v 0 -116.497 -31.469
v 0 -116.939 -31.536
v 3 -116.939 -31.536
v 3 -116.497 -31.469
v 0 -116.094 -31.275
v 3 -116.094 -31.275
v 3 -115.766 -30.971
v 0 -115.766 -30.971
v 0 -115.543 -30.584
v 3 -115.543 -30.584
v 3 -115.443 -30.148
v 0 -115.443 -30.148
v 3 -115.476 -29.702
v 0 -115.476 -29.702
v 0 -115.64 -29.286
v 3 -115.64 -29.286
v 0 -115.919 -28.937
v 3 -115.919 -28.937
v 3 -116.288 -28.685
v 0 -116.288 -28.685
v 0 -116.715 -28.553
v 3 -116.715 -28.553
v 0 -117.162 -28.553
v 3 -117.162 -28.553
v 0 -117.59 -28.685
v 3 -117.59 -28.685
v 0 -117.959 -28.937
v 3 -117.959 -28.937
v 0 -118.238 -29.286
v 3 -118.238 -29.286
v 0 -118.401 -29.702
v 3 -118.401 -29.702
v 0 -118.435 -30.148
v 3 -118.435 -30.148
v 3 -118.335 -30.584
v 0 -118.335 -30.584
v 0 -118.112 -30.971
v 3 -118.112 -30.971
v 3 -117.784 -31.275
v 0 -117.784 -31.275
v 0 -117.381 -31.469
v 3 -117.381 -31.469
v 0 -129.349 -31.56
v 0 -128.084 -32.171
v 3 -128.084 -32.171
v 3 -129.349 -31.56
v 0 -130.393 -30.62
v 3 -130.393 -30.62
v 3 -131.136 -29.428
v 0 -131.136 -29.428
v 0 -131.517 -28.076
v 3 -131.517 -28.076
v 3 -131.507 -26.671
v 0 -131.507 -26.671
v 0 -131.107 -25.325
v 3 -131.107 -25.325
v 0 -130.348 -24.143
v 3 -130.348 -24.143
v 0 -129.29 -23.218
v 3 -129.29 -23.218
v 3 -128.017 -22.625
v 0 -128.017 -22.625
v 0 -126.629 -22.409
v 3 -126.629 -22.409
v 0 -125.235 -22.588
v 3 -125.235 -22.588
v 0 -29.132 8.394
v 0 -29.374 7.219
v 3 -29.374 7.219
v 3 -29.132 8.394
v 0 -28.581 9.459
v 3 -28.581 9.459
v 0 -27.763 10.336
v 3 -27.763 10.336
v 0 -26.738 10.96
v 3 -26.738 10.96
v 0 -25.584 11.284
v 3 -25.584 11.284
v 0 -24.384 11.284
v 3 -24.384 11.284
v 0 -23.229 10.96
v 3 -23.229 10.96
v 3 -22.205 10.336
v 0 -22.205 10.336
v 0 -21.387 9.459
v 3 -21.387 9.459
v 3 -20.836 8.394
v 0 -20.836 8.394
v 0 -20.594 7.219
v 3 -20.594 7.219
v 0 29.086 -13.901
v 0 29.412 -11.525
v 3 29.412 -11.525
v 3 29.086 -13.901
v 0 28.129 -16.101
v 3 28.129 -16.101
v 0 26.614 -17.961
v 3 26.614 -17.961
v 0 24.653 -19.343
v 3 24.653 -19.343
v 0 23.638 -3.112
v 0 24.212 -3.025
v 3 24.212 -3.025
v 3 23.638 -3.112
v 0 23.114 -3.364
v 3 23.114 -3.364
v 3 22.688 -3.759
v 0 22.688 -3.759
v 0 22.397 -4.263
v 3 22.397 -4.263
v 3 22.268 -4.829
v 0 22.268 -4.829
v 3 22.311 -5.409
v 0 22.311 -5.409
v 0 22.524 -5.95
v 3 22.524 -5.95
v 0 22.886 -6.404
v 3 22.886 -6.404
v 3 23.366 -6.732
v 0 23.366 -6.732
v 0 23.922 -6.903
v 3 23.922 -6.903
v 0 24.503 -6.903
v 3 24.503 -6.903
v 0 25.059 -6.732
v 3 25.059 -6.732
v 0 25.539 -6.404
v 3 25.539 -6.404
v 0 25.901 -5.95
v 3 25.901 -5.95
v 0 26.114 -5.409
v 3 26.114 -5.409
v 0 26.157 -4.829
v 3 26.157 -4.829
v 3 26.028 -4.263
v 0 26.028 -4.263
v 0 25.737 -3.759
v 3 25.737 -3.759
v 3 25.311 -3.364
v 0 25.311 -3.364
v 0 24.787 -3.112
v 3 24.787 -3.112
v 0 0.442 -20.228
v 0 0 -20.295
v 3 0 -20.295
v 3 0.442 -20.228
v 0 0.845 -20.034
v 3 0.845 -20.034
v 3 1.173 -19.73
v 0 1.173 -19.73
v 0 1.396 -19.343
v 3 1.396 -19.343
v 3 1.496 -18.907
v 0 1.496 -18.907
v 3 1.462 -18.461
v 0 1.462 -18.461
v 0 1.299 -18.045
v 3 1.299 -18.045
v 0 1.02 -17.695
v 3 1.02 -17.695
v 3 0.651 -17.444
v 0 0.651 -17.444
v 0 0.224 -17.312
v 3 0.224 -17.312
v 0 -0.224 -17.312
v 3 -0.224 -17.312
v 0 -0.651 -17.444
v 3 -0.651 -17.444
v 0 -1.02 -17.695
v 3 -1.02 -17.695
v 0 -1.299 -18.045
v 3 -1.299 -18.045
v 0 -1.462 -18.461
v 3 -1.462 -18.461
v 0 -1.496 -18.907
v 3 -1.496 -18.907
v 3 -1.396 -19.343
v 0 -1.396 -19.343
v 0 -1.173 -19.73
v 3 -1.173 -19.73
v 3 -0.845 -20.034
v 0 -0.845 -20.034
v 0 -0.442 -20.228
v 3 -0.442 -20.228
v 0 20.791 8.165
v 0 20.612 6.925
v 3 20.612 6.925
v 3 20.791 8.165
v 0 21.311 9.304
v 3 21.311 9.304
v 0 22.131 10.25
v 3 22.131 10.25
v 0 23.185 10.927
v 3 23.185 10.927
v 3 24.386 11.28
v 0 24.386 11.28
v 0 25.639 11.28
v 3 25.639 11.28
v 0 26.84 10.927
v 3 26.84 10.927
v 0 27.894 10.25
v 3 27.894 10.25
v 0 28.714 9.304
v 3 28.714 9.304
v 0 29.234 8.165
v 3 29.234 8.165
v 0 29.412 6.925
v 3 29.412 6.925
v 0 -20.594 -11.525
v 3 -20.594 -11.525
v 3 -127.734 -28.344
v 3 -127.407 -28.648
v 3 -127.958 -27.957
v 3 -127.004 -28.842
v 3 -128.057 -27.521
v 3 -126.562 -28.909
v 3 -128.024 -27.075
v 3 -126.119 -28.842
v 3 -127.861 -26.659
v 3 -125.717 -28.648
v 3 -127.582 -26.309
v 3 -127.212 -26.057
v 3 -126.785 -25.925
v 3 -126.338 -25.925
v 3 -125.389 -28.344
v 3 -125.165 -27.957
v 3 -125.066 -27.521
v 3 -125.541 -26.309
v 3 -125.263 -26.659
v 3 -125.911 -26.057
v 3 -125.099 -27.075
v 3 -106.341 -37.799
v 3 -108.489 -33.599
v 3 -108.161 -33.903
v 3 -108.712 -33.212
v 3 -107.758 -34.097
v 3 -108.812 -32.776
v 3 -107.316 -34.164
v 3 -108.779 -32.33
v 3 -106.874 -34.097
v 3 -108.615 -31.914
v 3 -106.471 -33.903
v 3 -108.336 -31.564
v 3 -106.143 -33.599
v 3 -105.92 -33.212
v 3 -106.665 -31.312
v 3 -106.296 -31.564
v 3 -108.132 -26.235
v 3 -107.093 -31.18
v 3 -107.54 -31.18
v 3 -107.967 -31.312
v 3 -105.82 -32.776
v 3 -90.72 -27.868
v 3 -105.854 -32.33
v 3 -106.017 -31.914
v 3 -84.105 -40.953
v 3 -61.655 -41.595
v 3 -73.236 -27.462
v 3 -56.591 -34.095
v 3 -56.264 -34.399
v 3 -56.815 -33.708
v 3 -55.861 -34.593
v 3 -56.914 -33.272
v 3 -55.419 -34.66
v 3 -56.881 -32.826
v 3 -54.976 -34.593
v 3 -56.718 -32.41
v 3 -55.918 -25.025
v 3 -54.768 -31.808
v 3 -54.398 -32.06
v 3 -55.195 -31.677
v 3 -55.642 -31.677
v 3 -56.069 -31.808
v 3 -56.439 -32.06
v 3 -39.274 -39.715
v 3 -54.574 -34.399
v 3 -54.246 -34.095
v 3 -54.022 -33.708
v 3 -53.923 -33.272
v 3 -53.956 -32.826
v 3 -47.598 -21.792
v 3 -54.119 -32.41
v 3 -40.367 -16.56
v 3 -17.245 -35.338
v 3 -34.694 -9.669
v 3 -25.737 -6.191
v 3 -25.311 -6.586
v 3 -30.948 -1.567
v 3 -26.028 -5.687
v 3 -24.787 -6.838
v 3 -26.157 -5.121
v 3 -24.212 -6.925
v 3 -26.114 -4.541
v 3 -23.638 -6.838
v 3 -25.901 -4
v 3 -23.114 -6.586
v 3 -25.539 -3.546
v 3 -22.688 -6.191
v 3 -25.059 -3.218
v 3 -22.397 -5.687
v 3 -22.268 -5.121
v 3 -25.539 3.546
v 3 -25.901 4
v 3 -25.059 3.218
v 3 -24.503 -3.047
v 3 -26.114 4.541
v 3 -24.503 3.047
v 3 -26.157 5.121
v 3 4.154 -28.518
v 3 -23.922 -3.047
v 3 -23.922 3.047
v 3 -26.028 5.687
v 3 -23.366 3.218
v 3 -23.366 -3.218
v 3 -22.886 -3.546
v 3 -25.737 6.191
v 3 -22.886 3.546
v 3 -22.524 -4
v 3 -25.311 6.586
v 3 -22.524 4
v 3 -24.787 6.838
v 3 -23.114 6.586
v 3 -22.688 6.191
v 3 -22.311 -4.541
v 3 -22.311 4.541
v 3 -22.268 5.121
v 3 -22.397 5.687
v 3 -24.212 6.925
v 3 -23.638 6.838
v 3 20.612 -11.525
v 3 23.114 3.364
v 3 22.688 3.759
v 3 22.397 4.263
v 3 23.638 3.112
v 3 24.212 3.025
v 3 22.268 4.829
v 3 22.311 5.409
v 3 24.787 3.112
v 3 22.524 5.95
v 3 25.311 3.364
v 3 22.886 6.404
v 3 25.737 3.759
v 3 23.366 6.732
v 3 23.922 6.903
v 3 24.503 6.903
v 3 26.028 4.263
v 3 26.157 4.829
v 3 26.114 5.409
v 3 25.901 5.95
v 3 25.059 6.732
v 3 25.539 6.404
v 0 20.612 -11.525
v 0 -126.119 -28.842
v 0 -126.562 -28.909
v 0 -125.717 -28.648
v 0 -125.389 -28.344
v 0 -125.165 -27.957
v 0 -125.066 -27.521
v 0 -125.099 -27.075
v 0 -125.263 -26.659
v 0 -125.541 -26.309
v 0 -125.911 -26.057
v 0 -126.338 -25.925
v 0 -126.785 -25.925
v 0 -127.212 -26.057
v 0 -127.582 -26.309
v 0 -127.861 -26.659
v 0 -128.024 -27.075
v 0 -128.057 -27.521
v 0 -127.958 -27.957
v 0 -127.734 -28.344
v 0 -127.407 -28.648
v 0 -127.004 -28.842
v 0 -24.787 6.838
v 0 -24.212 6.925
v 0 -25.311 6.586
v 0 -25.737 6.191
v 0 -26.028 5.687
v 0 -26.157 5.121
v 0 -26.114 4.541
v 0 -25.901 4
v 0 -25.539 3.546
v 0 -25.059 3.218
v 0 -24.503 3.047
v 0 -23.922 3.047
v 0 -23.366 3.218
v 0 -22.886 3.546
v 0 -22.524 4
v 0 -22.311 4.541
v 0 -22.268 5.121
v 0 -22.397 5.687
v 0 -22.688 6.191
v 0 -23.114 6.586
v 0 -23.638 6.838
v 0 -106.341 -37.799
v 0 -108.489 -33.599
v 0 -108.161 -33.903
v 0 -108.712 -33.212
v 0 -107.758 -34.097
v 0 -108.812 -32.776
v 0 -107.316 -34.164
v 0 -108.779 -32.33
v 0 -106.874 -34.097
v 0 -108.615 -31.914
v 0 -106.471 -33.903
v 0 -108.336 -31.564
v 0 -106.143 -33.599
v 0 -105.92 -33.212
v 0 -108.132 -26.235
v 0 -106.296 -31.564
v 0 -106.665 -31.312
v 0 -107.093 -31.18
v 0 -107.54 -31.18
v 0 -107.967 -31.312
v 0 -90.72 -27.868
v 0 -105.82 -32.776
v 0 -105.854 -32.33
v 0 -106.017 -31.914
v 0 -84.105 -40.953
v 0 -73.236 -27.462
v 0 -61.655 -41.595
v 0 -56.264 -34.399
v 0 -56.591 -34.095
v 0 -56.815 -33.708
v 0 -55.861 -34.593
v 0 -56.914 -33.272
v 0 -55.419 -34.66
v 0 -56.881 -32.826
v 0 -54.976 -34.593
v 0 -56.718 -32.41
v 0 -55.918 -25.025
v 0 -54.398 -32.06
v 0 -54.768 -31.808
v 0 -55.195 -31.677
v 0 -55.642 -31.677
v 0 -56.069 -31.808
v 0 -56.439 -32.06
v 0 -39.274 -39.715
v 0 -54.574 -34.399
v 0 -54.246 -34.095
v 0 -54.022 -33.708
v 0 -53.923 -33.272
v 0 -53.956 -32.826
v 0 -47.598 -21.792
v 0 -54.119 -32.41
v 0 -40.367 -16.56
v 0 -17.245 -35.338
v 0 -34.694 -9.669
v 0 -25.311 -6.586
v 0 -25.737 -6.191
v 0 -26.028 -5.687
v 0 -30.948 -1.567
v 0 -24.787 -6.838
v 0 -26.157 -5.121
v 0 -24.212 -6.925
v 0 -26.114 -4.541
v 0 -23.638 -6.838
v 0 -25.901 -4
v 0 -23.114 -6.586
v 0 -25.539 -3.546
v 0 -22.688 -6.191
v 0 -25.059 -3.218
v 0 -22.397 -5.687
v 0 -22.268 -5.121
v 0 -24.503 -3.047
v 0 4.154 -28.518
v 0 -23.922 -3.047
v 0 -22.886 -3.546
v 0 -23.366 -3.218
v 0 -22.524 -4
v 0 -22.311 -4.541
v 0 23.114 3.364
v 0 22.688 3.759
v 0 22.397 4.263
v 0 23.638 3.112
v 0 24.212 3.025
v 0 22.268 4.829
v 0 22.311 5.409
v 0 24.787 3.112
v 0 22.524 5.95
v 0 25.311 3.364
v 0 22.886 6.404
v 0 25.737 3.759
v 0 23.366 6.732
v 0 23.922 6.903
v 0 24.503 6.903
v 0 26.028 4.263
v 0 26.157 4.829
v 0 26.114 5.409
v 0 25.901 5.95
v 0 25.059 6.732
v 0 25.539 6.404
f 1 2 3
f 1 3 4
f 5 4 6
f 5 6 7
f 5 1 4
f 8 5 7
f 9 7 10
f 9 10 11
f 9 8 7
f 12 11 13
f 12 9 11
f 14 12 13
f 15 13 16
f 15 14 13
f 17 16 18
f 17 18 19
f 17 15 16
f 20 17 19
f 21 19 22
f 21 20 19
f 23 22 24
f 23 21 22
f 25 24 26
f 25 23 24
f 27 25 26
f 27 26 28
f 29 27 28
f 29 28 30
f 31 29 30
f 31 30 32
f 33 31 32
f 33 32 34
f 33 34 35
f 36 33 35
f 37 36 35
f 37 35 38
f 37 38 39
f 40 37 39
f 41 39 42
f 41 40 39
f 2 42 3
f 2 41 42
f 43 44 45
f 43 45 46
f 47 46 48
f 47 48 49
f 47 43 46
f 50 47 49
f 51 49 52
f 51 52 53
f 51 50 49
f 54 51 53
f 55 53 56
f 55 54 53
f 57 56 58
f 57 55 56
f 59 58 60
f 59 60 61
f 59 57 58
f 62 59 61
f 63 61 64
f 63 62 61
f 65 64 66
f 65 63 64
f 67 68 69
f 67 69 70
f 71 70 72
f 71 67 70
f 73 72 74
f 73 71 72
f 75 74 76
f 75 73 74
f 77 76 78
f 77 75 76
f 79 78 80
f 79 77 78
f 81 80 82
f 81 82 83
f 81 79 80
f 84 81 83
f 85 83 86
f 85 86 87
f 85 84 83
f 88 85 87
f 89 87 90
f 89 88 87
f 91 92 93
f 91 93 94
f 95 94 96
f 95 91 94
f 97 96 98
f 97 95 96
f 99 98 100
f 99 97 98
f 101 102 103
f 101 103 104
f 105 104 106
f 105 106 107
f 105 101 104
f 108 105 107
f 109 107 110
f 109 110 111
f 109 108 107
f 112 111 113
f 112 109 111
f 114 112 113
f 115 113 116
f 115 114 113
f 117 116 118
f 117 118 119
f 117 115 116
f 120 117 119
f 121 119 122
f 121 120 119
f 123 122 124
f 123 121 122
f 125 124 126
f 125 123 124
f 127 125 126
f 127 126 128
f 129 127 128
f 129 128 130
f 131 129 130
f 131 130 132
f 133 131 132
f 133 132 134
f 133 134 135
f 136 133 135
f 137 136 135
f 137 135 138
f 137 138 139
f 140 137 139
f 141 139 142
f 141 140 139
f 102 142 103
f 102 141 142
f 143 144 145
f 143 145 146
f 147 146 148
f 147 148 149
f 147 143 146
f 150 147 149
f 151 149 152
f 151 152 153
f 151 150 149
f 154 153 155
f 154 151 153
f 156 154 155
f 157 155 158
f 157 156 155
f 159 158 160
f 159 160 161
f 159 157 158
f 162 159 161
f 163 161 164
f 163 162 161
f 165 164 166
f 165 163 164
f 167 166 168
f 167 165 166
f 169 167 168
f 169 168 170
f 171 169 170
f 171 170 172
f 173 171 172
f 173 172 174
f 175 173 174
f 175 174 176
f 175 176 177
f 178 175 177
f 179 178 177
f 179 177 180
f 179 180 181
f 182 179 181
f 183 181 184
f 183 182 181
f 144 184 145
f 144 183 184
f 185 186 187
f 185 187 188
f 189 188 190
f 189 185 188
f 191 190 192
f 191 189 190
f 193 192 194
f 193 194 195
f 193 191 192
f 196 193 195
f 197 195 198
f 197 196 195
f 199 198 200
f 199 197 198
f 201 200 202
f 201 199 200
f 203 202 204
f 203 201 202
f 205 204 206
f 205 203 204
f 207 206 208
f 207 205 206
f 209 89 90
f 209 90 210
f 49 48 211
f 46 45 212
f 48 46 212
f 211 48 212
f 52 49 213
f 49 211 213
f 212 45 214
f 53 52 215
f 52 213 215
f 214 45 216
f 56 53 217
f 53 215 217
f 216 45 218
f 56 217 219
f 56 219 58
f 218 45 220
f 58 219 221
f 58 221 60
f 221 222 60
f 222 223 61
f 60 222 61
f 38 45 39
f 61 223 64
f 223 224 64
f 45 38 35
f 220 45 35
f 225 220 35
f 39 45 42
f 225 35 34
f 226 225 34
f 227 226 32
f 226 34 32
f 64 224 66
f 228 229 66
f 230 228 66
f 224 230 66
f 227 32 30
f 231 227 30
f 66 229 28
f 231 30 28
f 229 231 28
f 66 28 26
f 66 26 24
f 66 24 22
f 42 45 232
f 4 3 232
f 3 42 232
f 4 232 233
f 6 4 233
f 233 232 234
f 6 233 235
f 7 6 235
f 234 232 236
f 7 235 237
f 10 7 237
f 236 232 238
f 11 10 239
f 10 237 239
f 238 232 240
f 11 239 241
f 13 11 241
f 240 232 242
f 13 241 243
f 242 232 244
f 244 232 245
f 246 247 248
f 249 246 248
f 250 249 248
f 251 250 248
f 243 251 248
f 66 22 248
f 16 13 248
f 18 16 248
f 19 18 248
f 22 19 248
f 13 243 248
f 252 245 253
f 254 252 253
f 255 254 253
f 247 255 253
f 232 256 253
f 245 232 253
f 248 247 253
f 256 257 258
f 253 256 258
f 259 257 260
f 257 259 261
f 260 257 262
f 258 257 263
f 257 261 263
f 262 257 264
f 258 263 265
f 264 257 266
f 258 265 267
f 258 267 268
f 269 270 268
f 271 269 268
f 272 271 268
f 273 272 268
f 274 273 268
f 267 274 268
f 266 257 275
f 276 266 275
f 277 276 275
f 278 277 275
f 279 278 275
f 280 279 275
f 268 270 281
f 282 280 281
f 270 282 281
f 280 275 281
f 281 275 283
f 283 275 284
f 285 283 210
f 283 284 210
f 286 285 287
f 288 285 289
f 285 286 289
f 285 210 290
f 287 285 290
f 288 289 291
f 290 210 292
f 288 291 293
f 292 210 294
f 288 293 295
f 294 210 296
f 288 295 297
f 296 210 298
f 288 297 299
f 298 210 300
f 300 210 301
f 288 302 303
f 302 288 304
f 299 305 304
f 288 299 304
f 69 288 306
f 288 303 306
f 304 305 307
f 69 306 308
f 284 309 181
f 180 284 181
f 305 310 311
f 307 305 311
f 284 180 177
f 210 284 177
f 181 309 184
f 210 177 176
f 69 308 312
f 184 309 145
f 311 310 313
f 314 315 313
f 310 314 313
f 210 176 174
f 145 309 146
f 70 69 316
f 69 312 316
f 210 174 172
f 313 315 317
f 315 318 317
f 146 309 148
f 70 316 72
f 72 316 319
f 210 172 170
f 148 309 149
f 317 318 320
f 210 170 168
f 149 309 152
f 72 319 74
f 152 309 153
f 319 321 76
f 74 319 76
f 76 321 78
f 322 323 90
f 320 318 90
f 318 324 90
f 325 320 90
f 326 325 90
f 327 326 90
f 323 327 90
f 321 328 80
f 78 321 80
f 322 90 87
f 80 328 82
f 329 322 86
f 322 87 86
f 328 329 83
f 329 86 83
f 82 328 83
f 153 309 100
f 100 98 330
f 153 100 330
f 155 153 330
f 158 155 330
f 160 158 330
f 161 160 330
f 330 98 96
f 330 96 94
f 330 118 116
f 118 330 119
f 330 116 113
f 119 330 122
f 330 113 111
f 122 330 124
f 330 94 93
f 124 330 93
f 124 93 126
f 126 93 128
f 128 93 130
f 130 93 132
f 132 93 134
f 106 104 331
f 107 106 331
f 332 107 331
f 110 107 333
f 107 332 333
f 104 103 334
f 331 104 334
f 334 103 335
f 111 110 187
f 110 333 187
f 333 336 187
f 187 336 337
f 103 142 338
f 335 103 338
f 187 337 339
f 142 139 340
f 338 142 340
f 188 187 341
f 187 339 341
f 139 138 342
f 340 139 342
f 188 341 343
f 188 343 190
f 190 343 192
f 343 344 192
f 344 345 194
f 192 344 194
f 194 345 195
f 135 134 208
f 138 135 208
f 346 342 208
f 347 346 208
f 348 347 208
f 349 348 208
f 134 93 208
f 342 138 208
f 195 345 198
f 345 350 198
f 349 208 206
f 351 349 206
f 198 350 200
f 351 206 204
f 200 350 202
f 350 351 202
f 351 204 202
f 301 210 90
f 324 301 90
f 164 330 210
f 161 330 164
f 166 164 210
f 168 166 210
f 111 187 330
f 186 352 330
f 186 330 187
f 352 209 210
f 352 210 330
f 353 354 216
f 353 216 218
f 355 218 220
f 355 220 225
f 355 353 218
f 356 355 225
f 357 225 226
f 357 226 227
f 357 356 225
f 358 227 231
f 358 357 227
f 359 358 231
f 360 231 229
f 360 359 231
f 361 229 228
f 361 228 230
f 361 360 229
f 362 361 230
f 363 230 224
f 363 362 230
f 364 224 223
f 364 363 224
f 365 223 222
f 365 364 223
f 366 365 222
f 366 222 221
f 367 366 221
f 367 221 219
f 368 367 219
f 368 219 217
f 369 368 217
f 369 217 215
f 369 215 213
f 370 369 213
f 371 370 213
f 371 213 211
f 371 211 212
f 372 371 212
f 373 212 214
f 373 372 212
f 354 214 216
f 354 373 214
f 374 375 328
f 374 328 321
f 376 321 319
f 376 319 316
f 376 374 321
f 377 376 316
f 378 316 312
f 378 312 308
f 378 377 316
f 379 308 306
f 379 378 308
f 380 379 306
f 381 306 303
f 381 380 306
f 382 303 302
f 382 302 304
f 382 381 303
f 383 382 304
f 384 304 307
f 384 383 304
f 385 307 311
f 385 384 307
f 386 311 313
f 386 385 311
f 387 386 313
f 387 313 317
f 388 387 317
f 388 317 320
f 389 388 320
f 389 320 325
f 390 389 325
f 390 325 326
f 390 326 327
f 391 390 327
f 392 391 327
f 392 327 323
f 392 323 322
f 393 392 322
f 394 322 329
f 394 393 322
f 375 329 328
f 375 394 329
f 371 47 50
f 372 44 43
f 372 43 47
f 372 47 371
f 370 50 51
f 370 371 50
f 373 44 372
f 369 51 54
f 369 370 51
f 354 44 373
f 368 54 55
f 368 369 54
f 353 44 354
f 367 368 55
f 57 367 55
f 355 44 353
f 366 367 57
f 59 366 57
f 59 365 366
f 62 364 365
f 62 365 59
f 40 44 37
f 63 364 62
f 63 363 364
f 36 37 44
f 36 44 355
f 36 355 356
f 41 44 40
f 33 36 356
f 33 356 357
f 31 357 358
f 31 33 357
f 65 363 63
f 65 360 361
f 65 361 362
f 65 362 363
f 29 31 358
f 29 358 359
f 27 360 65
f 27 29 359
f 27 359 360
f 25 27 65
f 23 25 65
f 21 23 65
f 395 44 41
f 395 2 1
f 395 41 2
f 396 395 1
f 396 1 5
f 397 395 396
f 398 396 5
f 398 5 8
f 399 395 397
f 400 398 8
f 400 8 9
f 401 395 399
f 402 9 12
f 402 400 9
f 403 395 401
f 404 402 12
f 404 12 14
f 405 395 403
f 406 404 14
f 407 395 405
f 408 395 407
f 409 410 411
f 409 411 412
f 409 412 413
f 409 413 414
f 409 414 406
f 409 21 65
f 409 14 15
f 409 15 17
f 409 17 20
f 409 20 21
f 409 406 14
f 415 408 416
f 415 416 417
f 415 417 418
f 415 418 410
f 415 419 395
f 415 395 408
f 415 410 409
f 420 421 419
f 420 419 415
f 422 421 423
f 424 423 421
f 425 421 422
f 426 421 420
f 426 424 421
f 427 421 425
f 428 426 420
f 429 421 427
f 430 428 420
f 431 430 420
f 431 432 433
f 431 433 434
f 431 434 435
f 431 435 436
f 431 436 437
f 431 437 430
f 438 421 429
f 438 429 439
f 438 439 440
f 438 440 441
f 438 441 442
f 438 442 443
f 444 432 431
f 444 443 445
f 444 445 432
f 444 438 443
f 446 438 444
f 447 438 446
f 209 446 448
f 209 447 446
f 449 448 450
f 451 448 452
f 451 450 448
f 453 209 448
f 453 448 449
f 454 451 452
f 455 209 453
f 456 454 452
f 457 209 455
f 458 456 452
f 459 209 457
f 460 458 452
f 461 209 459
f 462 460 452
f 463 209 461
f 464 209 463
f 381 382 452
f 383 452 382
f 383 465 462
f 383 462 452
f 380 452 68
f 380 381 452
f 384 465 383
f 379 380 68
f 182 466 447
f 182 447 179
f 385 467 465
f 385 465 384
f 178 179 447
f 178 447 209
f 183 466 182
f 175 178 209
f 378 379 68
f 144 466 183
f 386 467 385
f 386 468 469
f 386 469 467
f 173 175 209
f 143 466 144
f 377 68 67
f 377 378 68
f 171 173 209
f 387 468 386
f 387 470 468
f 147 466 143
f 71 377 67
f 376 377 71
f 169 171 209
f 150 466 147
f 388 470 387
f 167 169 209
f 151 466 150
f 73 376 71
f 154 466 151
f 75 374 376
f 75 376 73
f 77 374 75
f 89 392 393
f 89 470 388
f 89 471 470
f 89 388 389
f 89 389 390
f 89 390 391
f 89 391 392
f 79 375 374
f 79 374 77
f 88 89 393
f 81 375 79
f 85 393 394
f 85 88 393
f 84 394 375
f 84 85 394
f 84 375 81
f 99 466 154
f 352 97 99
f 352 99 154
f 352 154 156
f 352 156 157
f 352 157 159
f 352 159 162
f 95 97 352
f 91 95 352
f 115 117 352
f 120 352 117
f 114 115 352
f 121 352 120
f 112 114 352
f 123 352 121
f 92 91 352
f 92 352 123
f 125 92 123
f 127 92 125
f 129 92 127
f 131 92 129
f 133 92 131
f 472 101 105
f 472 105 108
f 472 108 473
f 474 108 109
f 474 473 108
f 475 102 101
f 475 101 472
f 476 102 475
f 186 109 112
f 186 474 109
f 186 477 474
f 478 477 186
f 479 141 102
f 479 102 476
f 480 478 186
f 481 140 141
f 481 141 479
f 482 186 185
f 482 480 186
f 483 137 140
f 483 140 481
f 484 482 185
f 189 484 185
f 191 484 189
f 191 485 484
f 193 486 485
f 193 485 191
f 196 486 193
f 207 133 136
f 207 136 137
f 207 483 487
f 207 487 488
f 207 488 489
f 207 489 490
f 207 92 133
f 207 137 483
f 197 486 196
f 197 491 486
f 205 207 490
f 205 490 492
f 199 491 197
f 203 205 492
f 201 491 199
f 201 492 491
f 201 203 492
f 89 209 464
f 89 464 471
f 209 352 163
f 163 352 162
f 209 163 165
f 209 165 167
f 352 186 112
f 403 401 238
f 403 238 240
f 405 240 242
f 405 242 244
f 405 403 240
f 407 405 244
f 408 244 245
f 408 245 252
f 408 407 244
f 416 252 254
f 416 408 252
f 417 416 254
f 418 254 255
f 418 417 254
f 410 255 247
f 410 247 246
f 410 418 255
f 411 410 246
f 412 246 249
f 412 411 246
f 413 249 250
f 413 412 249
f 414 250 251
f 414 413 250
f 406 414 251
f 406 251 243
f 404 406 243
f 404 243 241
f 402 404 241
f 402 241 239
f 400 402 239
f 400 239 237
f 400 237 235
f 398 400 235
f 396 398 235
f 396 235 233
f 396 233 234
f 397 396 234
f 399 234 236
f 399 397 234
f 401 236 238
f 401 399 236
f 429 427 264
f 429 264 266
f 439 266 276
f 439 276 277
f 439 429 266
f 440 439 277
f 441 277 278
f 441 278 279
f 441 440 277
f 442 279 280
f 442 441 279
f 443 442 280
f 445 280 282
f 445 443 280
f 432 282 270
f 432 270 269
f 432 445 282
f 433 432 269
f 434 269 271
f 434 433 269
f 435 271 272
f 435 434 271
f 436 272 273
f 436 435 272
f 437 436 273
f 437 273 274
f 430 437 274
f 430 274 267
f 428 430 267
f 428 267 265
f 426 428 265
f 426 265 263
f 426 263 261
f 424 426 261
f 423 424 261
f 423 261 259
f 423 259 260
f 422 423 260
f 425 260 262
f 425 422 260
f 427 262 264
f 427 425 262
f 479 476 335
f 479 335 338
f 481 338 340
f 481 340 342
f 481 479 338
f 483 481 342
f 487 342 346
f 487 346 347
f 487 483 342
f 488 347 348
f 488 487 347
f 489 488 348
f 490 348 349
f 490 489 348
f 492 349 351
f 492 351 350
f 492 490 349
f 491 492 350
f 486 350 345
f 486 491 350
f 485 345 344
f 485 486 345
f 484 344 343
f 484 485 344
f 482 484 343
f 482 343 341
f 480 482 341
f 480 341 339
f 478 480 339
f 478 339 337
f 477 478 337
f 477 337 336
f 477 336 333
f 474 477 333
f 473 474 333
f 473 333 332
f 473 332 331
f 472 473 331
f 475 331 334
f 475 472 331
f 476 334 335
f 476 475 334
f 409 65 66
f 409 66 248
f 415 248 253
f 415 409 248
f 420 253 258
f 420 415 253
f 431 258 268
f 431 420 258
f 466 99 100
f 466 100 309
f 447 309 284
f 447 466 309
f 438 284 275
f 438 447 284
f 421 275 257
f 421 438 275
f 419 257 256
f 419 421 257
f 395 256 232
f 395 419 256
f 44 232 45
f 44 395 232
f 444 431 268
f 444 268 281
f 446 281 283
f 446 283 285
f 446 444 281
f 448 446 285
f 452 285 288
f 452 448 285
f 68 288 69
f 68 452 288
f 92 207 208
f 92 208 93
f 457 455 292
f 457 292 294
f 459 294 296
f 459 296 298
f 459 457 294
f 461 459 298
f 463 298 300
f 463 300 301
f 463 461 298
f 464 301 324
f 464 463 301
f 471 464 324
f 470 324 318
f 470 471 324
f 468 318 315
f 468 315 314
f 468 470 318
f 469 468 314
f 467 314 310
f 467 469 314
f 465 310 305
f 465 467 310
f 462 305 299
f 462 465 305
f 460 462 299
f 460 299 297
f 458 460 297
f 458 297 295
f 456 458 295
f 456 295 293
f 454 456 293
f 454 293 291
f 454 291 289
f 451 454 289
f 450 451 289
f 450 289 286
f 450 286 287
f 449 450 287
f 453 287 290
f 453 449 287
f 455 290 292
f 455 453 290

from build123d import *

# Parameters (mm, degrees)
SKETCH1_R           = 1.95
SKETCH1_R_2         = 1.5
BOSS_EXTRUDE1_DEPTH = 3


with BuildPart() as part:
    # Sketch1 → Boss-Extrude1 (new body)
    with BuildSketch(Plane(origin=(0, 0, 0), x_dir=(0, 0, -1), z_dir=(1, 0, 0))):
        with BuildLine():
            Line((-6.925, 29.4125), (11.525, 29.4125))
            ThreePointArc((11.525, 29.4125), (16.101209281, 28.129035679), (19.342554621, 24.653024687))
            ThreePointArc((19.342554621, 24.653024687), (40.969128184, -50.437912981), (32.171039161, -128.084234422))
            ThreePointArc((32.171039161, -128.084234422), (25.983785002, -131.35426762), (22.587628574, -125.235333672))
            ThreePointArc((22.587628574, -125.235333672), (27.867812209, -90.719506549), (25.024864397, -55.91806536))
            ThreePointArc((25.024864397, -55.91806536), (13.295850828, -37.309652467), (-7.219256672, -29.374089856))
            ThreePointArc((-7.219256672, -29.374089856), (-11.325, -24.983940313), (-7.219256672, -20.59379077))
            Line((-7.219256672, -20.59379077), (11.525, -20.59379077))
            Line((11.525, -20.59379077), (11.525, 20.6125))
            Line((11.525, 20.6125), (-6.925, 20.6125))
            ThreePointArc((-6.925, 20.6125), (-11.325, 25.0125), (-6.925, 29.4125))
        make_face()
        with Locations((-4.975, 24.2125)):
            Circle(SKETCH1_R, mode=Mode.SUBTRACT)
        with Locations(Location((4.975, 24.2125, 0), (0, 0, 180))):
            Circle(SKETCH1_R, mode=Mode.SUBTRACT)
        with Locations((4.975, -24.2125)):
            Circle(SKETCH1_R, mode=Mode.SUBTRACT)
        with Locations(Location((-4.975, -24.2125, 0), (0, 0, 180))):
            Circle(SKETCH1_R, mode=Mode.SUBTRACT)
        with Locations((18.795, 0)):
            Circle(SKETCH1_R_2, mode=Mode.SUBTRACT)
        with Locations((33.159858862, -55.41852876)):
            Circle(SKETCH1_R_2, mode=Mode.SUBTRACT)
        with Locations((32.663736784, -107.316157442)):
            Circle(SKETCH1_R_2, mode=Mode.SUBTRACT)
        with Locations((30.036135717, -116.938856525)):
            Circle(SKETCH1_R_2, mode=Mode.SUBTRACT)
        with Locations((27.408534649, -126.561555607)):
            Circle(SKETCH1_R_2, mode=Mode.SUBTRACT)
    extrude(amount=BOSS_EXTRUDE1_DEPTH)


solid = part.part
